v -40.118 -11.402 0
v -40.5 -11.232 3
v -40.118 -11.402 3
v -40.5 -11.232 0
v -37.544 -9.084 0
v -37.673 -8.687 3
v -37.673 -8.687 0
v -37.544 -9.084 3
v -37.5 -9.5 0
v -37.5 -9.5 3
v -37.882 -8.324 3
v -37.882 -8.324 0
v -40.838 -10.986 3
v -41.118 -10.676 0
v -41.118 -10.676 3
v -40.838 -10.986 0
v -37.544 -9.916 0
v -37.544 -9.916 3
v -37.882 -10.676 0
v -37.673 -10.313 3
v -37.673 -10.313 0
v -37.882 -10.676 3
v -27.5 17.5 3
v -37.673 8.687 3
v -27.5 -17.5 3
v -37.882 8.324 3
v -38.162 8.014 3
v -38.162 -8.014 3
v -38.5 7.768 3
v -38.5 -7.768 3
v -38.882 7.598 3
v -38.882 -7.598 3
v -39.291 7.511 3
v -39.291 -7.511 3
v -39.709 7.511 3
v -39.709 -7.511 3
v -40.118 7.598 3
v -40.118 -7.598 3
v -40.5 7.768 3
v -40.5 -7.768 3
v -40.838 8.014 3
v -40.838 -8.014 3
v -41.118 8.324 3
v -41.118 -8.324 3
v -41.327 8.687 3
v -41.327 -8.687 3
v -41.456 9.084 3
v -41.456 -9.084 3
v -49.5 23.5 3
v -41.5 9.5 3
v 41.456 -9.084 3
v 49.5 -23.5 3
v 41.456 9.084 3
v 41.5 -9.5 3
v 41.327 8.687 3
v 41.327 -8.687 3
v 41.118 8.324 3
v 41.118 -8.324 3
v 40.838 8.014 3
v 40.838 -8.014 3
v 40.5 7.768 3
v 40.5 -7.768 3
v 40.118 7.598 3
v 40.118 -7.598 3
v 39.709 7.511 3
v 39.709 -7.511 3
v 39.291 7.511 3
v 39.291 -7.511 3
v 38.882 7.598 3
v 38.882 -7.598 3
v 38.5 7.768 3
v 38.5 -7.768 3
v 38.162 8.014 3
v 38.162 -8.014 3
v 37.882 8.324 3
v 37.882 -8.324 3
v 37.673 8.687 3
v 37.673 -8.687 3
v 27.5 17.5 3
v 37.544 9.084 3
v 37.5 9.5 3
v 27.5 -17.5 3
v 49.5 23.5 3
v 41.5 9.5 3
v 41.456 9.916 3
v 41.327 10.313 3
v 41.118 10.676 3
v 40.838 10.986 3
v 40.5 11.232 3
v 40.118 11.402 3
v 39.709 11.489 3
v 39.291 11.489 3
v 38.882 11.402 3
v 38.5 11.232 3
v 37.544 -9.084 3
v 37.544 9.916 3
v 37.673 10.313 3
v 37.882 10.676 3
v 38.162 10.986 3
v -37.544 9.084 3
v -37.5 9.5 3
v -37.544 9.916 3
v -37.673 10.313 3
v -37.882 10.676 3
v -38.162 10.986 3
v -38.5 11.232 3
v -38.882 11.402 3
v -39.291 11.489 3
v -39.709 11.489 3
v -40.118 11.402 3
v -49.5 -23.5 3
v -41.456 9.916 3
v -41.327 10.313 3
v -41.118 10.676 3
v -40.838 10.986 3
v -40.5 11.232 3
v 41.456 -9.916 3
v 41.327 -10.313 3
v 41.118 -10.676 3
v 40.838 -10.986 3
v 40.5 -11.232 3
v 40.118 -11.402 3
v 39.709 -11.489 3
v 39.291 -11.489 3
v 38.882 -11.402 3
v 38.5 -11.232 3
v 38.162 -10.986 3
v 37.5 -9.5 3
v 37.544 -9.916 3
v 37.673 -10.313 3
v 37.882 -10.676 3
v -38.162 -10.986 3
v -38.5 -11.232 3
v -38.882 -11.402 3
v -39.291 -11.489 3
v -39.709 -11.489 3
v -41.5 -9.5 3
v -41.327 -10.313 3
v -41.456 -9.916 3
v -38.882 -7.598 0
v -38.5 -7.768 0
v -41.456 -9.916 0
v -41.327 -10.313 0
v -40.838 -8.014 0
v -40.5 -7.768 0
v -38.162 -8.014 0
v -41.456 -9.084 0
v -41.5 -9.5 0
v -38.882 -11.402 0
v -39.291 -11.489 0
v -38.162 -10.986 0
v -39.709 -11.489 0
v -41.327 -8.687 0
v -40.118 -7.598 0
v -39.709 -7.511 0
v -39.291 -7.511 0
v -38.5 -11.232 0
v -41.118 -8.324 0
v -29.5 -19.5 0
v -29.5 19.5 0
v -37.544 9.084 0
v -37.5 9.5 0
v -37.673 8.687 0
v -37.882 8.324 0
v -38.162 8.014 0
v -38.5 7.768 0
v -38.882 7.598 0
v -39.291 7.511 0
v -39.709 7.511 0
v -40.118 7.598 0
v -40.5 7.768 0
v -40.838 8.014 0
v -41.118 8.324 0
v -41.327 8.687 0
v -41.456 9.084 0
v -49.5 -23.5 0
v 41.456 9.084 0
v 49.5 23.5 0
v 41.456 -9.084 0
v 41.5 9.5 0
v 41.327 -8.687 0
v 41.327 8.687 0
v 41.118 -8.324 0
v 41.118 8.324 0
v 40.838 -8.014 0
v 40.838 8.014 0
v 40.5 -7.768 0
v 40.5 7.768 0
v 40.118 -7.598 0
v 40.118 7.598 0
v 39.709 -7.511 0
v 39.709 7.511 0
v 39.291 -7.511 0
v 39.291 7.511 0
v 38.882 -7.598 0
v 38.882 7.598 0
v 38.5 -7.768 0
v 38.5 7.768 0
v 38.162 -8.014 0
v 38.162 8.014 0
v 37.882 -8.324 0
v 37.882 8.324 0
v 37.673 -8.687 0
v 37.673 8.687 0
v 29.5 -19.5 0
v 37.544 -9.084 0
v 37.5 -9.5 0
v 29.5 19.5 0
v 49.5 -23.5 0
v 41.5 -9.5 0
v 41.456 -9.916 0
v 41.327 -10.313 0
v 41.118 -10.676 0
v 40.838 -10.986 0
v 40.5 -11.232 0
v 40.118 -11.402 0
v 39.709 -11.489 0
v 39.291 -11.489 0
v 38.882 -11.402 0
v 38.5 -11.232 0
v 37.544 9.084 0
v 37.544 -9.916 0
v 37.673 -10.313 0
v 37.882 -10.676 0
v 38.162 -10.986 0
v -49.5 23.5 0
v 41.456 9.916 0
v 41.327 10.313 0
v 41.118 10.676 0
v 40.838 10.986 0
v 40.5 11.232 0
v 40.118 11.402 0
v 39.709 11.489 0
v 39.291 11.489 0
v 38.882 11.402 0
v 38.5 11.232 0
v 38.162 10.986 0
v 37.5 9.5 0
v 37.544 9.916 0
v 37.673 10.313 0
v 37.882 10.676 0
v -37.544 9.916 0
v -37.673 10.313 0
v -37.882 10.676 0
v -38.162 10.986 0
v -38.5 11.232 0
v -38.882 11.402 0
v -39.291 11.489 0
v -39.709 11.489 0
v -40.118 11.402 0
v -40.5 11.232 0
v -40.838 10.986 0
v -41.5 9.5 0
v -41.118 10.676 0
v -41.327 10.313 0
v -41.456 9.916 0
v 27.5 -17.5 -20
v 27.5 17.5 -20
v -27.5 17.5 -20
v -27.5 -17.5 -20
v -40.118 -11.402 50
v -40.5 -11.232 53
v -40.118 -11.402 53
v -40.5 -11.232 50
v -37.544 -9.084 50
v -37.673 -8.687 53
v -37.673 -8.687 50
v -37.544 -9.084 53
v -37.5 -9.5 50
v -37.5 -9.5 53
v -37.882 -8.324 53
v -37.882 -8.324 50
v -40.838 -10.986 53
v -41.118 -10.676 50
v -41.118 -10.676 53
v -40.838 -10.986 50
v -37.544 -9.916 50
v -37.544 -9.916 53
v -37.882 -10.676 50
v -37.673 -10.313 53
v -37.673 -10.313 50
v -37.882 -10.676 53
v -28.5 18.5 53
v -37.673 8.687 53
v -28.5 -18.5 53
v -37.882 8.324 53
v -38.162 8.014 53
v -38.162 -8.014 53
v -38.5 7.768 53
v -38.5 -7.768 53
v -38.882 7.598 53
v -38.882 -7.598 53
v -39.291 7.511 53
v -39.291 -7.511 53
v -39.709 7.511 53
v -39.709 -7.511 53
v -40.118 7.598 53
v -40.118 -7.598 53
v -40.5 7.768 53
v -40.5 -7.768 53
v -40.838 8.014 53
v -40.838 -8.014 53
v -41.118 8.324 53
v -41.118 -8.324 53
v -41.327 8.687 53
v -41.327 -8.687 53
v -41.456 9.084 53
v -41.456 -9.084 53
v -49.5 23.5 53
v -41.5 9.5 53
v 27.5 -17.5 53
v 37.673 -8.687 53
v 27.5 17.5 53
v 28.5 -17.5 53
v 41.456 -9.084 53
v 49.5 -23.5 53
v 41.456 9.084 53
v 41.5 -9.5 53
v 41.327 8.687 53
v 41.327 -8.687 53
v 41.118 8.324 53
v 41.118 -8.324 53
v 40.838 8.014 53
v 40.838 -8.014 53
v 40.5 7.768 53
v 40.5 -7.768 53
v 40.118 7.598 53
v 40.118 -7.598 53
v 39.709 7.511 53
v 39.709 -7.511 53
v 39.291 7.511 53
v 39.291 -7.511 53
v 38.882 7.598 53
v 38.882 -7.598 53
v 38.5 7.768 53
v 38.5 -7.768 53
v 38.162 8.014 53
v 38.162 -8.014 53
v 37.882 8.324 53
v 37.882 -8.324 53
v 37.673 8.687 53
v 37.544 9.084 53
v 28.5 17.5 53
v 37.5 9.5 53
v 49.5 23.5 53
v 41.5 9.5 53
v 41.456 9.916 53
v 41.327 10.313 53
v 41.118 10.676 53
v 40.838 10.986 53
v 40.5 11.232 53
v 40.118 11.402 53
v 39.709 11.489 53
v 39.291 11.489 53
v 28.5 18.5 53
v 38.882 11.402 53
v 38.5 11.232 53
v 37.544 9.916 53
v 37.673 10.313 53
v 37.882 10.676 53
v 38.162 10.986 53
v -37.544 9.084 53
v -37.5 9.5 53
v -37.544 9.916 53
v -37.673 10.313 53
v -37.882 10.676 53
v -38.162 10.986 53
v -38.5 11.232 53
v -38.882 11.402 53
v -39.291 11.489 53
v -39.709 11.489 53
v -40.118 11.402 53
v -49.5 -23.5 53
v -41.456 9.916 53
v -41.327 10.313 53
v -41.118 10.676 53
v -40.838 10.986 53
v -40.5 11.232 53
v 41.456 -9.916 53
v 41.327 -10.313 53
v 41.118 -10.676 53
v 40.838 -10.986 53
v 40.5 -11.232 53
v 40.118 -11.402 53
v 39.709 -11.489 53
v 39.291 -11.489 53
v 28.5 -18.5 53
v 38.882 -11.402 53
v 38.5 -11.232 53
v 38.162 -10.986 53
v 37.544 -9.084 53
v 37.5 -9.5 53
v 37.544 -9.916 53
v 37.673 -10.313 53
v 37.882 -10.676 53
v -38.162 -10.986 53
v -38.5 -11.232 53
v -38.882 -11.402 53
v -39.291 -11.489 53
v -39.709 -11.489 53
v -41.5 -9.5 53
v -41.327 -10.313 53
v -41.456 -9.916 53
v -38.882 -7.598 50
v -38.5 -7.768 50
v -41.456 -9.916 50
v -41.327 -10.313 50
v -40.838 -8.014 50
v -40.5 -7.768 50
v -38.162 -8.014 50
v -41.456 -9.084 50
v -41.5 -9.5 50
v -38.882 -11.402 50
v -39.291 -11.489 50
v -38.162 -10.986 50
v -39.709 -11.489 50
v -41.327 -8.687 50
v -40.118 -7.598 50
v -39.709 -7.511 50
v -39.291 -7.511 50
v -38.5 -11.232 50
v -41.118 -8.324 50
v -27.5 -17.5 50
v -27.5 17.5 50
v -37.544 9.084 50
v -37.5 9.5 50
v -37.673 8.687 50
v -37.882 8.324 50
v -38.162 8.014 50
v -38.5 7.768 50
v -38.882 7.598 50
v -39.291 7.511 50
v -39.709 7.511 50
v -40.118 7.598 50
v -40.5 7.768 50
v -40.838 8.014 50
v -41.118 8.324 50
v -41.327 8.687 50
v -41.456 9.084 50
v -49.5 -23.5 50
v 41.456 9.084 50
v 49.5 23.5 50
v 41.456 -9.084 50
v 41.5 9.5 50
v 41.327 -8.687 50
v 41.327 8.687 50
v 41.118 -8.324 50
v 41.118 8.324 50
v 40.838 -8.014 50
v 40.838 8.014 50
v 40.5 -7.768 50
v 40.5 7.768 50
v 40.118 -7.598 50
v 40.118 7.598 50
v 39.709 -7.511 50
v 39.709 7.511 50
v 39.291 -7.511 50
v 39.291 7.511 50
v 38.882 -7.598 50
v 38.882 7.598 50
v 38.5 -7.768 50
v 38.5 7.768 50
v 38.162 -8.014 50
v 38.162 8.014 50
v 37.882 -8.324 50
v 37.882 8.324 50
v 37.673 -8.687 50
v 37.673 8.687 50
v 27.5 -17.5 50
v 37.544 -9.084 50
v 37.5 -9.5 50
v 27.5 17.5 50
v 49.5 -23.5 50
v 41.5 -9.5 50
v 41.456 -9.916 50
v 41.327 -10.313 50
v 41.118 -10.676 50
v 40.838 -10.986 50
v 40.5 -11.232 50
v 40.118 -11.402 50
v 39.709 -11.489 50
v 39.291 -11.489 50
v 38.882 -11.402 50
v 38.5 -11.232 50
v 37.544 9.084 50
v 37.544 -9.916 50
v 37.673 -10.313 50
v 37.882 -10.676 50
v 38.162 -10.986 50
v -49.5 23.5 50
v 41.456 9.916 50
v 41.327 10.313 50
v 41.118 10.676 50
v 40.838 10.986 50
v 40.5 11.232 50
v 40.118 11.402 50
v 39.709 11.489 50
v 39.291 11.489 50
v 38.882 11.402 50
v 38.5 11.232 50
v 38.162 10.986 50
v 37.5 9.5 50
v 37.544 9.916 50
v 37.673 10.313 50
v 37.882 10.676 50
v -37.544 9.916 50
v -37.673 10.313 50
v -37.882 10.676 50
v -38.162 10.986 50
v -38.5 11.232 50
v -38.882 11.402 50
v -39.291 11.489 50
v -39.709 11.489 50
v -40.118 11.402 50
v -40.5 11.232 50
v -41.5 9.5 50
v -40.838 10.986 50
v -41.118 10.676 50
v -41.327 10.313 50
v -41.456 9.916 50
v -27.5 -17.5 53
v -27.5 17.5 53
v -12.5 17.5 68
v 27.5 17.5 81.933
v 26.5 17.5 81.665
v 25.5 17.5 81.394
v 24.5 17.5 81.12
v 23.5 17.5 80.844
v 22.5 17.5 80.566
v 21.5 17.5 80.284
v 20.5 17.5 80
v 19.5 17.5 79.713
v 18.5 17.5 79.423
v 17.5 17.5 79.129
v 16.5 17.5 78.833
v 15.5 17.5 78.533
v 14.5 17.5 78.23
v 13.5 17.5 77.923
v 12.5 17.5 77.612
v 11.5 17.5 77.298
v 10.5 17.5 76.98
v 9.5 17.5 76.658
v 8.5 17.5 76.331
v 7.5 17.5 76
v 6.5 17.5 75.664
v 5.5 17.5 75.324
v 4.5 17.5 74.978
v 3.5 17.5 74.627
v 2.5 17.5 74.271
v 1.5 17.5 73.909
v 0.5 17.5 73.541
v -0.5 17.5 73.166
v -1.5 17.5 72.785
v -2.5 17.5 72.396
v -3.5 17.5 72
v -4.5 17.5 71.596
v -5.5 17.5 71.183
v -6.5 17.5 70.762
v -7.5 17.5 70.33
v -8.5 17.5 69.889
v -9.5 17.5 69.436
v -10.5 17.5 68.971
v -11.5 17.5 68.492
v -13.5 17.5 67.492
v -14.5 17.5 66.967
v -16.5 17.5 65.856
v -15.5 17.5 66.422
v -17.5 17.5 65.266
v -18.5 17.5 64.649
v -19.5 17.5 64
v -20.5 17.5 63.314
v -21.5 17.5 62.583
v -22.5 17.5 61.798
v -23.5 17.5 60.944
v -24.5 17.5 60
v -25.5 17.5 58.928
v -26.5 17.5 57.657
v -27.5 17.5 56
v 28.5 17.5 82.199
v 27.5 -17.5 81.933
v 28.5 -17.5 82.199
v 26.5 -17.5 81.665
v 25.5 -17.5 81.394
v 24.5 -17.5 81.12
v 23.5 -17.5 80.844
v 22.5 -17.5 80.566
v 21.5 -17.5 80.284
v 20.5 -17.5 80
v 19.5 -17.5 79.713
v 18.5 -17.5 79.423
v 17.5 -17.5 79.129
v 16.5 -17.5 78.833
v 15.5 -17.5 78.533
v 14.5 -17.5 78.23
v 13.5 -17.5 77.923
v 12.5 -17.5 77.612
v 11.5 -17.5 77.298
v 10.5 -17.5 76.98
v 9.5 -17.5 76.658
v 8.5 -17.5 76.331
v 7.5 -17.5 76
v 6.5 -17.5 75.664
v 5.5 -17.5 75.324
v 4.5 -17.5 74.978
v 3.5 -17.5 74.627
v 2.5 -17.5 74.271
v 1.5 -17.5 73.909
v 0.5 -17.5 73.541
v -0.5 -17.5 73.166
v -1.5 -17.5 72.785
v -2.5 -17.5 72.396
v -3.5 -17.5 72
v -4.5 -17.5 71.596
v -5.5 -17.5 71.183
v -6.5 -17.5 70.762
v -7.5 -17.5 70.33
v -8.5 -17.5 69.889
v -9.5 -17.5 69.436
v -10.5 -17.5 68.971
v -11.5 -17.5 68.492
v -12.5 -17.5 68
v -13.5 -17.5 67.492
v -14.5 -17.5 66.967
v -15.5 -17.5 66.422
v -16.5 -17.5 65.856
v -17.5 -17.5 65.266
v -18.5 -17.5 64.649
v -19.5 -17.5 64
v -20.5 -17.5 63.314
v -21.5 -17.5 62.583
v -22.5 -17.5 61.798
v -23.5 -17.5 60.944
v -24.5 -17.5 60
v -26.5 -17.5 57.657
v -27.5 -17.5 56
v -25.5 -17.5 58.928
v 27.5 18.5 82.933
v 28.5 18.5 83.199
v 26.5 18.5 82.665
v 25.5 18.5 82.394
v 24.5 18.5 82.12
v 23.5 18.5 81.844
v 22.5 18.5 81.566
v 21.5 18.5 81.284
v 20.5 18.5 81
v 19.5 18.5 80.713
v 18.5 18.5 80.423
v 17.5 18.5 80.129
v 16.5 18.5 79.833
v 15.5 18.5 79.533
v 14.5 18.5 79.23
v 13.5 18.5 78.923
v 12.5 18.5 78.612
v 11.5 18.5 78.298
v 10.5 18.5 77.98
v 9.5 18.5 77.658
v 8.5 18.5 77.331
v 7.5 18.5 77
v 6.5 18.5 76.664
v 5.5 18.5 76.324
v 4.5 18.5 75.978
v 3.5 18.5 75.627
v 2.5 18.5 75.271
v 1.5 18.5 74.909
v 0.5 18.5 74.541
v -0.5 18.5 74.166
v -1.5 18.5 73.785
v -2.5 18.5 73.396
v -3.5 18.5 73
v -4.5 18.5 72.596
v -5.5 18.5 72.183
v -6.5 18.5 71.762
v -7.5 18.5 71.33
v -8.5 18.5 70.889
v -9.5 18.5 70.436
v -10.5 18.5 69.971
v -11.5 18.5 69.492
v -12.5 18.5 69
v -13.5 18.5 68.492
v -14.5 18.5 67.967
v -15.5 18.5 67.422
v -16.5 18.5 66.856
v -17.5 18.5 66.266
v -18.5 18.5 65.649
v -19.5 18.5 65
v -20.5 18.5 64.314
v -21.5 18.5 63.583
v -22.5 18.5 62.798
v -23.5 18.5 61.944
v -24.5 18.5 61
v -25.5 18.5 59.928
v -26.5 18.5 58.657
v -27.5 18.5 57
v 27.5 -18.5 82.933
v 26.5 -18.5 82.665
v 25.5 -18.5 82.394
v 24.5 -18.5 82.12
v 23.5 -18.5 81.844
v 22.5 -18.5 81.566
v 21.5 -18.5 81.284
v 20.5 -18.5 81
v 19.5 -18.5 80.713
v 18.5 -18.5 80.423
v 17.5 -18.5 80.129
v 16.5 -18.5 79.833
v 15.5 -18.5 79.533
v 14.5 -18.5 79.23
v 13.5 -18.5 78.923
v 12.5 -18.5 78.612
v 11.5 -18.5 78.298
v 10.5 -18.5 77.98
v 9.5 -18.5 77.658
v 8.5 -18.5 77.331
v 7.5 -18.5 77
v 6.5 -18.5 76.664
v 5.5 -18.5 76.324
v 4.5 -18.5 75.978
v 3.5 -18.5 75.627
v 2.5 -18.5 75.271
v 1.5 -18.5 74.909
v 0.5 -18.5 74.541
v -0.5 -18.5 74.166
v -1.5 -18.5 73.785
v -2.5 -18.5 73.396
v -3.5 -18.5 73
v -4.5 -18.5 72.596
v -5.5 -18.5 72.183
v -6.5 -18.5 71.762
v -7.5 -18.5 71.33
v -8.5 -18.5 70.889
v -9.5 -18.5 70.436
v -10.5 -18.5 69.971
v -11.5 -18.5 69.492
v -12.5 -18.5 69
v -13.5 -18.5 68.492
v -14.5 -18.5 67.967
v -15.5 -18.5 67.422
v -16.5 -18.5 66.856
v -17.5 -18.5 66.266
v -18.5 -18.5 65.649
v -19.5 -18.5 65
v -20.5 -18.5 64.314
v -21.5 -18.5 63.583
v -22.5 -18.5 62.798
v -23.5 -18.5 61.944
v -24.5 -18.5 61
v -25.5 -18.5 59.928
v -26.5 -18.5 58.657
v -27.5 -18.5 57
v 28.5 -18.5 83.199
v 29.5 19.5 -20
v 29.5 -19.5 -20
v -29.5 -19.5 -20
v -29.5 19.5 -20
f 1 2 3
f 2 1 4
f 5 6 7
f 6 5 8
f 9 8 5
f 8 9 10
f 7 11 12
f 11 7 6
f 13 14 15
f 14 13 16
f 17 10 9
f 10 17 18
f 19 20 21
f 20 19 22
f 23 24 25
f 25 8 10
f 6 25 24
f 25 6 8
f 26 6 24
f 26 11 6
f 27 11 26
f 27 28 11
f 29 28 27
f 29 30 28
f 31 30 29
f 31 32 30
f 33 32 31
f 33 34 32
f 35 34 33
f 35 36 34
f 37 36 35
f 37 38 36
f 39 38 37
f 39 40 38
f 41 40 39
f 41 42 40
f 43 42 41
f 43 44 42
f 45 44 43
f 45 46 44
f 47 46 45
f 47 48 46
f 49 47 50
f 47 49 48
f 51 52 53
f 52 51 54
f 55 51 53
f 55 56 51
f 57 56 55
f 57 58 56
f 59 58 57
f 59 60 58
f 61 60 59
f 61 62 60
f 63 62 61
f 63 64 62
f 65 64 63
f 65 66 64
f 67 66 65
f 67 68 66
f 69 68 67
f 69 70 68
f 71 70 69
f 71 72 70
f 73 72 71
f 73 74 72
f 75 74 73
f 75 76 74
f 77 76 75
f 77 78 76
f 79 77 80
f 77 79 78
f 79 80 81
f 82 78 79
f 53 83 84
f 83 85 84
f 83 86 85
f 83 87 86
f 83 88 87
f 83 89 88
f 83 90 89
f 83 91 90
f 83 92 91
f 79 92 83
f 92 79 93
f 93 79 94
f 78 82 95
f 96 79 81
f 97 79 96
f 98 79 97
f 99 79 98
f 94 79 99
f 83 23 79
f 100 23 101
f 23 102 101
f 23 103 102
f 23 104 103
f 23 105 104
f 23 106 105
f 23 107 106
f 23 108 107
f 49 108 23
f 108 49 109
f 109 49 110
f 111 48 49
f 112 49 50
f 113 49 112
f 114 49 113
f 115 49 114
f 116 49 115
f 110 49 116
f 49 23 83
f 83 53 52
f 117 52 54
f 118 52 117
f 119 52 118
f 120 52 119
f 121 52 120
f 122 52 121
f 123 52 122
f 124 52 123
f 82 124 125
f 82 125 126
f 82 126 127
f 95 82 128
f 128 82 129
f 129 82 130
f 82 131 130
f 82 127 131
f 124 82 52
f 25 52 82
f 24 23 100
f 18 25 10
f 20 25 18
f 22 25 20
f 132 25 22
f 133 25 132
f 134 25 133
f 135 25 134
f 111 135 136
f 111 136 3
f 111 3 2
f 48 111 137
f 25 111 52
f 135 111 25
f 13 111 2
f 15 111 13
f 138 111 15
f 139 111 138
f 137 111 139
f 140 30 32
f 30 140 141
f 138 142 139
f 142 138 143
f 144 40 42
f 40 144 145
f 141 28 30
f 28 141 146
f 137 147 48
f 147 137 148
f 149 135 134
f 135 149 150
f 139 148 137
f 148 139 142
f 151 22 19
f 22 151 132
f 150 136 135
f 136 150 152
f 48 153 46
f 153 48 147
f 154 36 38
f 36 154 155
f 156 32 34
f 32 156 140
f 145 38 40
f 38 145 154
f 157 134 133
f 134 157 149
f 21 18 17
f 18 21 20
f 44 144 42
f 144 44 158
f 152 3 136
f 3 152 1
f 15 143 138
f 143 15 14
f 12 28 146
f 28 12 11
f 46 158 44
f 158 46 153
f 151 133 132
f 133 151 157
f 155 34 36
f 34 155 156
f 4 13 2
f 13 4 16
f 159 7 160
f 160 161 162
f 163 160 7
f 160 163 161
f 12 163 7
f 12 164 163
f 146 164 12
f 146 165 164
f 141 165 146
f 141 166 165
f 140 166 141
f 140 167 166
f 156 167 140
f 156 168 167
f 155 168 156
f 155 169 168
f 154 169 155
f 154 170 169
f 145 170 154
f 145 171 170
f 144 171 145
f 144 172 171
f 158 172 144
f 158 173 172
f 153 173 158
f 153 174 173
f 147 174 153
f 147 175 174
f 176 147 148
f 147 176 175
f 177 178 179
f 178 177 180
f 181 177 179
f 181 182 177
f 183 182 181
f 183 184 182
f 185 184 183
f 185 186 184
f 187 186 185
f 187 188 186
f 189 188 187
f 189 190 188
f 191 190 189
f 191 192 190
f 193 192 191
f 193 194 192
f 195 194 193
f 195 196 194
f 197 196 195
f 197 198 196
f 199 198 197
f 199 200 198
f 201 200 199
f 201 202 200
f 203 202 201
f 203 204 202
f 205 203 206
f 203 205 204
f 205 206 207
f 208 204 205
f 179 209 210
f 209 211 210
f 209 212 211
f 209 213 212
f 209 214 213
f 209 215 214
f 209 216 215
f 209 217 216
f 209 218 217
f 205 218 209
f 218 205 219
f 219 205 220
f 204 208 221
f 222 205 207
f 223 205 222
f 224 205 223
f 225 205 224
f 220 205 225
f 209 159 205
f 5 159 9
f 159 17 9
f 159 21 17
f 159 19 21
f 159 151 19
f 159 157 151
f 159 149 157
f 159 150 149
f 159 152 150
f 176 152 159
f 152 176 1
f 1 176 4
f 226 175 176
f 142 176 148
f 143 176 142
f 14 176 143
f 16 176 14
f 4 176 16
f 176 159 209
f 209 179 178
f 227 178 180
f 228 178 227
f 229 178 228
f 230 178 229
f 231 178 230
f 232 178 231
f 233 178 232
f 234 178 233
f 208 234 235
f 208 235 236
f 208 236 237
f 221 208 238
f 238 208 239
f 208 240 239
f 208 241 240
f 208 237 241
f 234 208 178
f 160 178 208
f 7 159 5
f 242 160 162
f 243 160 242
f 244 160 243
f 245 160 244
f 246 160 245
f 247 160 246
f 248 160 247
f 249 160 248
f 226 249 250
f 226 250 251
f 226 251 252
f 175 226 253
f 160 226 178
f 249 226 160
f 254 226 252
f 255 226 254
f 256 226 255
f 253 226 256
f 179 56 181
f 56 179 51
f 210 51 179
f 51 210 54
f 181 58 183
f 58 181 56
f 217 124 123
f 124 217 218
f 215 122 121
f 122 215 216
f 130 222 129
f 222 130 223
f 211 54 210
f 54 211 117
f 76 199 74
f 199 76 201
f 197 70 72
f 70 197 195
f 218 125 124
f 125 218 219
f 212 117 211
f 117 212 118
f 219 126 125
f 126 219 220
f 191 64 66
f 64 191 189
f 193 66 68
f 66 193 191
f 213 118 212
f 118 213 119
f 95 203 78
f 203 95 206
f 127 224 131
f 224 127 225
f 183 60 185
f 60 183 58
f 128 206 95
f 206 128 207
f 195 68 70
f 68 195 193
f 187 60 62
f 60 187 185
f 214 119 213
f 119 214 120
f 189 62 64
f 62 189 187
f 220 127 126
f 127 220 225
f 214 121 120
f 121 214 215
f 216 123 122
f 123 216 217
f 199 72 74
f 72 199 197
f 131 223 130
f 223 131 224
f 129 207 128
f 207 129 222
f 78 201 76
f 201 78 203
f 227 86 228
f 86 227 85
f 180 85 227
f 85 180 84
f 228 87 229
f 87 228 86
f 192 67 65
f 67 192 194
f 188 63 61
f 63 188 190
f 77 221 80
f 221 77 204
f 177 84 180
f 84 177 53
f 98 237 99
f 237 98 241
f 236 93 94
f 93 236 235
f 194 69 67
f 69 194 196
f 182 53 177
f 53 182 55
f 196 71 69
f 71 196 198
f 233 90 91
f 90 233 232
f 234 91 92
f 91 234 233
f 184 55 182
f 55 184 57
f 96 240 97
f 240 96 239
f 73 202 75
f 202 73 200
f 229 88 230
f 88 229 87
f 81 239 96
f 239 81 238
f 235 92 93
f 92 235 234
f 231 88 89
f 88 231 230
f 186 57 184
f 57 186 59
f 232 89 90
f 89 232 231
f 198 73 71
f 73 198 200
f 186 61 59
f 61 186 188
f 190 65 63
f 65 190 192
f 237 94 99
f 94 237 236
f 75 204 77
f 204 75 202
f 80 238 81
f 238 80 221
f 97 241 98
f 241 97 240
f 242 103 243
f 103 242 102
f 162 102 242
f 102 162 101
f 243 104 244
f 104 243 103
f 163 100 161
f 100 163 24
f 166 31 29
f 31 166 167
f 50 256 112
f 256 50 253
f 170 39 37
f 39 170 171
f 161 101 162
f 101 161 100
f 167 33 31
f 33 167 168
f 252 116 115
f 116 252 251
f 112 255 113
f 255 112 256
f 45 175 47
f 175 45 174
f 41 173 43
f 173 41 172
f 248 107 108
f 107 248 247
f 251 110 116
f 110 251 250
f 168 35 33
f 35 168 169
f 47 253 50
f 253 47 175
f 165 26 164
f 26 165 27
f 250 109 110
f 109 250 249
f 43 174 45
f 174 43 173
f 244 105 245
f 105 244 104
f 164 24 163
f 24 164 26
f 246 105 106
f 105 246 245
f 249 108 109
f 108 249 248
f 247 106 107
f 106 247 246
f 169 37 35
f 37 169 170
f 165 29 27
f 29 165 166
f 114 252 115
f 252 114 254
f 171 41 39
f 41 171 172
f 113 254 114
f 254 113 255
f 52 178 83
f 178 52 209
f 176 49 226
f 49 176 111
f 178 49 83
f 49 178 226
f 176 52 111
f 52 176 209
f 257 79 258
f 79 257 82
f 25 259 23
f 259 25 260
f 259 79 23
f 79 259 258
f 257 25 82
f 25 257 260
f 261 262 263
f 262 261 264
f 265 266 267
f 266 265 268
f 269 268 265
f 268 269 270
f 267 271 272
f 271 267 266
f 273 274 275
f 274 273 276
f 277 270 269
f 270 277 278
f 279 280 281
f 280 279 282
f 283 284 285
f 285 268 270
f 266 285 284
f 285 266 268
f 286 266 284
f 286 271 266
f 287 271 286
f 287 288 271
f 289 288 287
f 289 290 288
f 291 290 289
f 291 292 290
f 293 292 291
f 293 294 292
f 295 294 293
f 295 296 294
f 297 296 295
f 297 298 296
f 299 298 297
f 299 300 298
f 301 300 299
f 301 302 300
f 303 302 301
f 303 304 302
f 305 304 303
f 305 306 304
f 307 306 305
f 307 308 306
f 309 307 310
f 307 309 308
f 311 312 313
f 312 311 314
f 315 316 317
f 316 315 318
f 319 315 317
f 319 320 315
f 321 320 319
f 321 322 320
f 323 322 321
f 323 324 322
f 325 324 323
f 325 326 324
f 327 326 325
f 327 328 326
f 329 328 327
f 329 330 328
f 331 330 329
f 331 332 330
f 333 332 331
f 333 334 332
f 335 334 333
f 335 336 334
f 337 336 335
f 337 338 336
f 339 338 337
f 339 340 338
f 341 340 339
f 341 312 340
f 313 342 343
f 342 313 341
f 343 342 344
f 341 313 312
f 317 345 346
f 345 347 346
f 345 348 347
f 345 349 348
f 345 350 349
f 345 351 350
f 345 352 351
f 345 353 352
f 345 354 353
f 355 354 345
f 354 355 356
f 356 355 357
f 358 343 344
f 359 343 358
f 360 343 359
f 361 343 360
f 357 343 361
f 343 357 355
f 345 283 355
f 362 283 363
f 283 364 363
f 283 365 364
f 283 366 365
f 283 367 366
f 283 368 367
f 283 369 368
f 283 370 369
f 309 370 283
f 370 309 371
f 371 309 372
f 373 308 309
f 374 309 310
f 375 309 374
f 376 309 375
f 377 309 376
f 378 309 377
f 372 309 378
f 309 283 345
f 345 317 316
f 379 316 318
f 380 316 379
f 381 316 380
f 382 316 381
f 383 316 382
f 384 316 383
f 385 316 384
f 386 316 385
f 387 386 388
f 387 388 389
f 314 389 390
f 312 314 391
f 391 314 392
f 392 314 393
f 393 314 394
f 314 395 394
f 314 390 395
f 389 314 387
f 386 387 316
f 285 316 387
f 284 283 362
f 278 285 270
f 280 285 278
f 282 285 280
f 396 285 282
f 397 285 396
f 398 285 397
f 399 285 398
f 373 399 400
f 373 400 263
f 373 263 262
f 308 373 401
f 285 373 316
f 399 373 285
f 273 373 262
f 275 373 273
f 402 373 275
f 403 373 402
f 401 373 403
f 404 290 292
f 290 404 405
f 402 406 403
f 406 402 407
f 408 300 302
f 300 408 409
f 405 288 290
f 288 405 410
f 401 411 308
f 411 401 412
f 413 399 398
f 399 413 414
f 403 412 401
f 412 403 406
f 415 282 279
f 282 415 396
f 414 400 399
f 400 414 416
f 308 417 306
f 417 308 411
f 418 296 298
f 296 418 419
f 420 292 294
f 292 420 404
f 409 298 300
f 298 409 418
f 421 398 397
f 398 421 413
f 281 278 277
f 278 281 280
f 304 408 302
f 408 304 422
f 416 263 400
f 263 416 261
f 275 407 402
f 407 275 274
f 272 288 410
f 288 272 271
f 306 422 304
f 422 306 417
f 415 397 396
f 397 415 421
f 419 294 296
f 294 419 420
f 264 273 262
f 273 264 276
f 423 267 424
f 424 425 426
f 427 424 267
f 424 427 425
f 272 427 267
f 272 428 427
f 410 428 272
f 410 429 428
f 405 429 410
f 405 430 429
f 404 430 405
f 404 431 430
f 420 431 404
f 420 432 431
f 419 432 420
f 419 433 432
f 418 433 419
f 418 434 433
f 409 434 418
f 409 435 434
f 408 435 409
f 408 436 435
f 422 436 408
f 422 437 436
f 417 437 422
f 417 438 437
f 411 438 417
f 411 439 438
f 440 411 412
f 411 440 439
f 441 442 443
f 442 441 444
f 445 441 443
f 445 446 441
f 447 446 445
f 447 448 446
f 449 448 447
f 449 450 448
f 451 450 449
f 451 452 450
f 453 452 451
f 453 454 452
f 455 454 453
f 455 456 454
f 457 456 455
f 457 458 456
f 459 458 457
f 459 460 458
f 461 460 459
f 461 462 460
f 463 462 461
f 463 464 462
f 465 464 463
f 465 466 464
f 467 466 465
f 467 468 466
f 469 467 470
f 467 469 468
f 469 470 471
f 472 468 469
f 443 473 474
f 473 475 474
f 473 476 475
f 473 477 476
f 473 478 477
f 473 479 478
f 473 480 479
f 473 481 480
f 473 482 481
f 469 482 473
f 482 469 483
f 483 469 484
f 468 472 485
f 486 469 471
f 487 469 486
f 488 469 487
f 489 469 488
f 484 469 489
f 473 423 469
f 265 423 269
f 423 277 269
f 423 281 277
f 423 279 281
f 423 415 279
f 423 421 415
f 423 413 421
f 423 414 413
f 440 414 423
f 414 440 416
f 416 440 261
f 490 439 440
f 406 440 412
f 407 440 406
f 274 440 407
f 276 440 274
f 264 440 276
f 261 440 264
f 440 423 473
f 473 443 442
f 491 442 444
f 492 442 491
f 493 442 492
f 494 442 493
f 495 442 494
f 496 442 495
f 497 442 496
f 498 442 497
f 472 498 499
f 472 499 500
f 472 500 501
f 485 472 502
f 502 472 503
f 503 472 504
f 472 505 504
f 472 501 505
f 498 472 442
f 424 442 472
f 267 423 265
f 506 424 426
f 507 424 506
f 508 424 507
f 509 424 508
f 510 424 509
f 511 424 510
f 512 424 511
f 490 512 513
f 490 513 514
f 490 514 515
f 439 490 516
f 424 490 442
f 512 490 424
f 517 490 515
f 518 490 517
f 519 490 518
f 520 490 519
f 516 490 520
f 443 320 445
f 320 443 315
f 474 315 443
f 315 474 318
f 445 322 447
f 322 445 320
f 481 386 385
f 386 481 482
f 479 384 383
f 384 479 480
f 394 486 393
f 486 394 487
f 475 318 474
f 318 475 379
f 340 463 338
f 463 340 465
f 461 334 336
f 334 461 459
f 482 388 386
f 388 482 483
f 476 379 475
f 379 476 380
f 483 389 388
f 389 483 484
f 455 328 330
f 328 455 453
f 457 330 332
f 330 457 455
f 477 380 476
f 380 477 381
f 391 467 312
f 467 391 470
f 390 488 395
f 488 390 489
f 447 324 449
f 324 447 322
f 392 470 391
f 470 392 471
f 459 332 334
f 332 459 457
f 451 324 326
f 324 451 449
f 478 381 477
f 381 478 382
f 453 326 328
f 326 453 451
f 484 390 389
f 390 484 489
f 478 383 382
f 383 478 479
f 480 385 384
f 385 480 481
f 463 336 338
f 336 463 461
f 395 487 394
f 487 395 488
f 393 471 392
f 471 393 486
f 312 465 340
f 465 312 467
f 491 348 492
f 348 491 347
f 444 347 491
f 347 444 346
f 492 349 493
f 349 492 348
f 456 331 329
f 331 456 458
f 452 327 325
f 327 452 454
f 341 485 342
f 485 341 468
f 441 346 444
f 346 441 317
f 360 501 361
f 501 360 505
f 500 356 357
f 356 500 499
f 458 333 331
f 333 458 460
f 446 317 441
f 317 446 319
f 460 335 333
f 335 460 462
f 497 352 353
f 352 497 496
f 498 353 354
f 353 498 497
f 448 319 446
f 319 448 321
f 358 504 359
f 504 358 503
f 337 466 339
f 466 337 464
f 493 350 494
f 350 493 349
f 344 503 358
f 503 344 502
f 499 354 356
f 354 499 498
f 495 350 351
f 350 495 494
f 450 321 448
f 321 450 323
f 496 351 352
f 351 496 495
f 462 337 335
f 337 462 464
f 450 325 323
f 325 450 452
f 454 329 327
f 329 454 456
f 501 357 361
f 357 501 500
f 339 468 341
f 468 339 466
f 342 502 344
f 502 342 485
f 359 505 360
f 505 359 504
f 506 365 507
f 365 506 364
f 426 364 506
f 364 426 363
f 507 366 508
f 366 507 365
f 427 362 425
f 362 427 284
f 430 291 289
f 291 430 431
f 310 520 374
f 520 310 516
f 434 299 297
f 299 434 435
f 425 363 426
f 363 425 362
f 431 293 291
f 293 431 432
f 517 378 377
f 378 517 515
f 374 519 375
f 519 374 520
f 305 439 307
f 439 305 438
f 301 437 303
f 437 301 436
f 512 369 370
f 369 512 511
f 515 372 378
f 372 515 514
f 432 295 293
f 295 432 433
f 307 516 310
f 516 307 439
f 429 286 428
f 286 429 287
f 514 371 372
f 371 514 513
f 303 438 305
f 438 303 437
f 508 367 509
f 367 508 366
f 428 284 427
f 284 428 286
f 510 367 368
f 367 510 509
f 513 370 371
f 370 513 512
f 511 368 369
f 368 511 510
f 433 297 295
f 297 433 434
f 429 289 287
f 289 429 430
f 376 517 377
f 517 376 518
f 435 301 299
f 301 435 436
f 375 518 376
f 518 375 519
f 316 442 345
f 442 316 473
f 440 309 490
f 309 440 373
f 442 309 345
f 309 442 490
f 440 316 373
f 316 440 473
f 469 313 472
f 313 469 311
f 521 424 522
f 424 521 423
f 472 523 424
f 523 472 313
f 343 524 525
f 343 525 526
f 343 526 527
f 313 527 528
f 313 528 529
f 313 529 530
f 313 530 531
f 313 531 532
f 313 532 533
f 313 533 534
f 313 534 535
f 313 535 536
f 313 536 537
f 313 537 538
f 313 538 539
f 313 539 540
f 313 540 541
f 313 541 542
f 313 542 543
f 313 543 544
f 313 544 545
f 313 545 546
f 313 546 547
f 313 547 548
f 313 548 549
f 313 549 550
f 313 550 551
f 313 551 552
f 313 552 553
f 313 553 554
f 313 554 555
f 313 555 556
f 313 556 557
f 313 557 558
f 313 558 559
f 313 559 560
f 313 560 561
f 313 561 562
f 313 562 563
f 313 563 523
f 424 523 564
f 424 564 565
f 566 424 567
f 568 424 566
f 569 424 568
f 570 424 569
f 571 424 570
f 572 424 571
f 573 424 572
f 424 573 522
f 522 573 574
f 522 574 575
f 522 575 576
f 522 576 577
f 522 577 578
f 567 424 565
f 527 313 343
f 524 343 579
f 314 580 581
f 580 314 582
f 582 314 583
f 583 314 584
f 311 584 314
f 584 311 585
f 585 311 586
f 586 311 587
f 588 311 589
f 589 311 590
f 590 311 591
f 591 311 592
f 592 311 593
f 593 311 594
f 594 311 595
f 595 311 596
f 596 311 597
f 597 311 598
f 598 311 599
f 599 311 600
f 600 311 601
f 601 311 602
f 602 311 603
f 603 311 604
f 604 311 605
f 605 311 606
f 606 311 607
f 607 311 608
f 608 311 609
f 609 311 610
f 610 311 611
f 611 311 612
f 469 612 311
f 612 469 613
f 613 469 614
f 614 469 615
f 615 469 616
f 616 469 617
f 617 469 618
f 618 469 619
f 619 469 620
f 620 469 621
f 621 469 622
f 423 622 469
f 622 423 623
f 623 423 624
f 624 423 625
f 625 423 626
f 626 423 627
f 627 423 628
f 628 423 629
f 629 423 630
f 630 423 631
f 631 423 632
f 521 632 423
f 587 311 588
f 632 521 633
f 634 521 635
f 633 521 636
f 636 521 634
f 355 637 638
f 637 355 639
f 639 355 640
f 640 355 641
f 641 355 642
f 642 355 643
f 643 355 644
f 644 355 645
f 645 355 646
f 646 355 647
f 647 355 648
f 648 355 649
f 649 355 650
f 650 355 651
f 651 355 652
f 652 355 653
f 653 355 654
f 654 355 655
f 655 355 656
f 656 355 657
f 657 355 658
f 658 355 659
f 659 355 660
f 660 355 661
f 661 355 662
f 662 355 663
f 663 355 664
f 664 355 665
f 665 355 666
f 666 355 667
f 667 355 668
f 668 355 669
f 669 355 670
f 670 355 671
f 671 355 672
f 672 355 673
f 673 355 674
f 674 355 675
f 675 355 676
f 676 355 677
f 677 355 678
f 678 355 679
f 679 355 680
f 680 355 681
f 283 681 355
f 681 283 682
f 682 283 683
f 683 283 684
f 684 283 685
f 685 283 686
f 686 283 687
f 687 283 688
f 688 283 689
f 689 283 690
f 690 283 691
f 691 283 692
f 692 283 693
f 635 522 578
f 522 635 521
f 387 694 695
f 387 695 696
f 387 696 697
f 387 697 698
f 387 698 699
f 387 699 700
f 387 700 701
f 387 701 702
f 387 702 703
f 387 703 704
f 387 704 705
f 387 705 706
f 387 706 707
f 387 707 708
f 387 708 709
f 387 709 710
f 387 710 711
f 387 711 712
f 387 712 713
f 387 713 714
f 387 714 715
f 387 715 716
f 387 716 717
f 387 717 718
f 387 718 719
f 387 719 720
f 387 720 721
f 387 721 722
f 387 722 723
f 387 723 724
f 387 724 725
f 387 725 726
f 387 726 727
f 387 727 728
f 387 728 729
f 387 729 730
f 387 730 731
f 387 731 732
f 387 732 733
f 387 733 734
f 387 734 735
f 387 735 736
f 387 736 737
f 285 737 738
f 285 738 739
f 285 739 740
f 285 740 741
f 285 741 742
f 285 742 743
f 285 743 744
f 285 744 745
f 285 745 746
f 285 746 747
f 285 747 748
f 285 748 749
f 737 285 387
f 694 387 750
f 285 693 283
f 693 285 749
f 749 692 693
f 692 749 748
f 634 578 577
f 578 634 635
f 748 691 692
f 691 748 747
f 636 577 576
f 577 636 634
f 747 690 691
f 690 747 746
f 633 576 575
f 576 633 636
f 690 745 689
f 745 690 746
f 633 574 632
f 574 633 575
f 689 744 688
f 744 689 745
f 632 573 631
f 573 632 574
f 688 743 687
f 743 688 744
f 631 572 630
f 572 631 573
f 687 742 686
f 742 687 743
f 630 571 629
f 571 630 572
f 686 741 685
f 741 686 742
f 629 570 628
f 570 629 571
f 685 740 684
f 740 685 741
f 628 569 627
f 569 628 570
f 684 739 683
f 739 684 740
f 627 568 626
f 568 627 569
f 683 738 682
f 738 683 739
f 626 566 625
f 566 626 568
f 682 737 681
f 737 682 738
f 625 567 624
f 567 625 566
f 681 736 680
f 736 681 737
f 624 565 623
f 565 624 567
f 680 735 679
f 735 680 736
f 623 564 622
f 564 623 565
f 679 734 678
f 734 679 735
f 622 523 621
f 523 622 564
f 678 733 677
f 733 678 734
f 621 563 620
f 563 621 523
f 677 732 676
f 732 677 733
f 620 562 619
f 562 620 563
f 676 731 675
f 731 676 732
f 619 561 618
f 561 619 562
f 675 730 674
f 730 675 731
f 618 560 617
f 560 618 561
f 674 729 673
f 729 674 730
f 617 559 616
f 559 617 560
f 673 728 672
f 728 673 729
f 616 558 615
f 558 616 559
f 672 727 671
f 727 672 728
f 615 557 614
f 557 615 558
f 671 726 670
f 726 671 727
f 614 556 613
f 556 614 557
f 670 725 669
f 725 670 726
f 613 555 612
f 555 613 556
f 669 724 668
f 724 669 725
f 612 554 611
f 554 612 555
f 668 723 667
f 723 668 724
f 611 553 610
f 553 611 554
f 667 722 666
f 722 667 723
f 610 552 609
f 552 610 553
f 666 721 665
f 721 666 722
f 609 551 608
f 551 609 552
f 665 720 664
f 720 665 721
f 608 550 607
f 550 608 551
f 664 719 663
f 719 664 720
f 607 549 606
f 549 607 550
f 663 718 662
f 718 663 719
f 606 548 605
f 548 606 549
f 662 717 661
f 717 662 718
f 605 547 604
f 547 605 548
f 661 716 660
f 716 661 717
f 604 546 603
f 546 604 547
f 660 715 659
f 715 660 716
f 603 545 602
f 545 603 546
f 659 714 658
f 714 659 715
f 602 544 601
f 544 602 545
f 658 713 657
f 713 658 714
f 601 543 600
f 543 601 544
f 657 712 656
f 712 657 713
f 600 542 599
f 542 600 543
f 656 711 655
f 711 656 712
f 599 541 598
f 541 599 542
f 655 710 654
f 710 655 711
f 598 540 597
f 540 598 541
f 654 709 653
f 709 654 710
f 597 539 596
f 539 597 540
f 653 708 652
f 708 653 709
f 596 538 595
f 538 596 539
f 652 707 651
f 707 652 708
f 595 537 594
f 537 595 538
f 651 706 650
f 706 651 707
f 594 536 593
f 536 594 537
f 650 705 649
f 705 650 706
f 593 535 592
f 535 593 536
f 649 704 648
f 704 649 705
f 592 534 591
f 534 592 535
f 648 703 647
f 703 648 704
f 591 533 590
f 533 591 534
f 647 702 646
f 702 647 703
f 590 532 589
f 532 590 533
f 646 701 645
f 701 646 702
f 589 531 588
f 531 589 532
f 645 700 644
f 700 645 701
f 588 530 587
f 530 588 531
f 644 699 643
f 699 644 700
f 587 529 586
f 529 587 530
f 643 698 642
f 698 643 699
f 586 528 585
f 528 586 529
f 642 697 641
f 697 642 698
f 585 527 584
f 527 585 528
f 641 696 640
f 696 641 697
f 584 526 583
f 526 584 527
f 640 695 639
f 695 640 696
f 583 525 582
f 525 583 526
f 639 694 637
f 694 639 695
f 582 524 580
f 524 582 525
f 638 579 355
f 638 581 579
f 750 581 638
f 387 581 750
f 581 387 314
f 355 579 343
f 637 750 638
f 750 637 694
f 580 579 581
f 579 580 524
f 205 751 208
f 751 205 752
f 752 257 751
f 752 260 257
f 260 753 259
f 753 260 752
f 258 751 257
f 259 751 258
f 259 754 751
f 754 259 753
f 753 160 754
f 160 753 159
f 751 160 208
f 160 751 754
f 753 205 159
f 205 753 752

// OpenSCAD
part = "both"; //[both, top, bottom]

ductWidth = 39; //[200]
ductLength = 59; //[200]
ductDepth = 20; //[200]

//Duct Wall Thickness
wallThickness = 2; //[10]

//Baseplate Width
plateWidth = 47; //[200]
//Baseplate Length
plateLength = 99; //[200]
basePlateThickness = 3; //[20]

outletAngleDegrees = 30; //[90]
outletWallThickness = 1; //[10]

//Screwhole Diameter
holeDiameter = 4; //[10]
//X-offset from outer edge to center of screwhole
xHoleOffset = 10; //[100]
//Y-offset from outer edge to center of screwhole
yHoleOffset = 14; //[100]

// Distance between polygons in the outlet
outletRes = 1; //[1]


module mountingHoles(depth){
    x = plateLength - (2 * xHoleOffset);
    y = plateWidth - (2 * yHoleOffset);
    module mountingHole(depth, diameter) {
        cylinder(h = depth, r = 0.5 * diameter, center = false, $fs=0.1);
    }
    union(){
        mountingHole(depth, holeDiameter);
        translate([x,0]) mountingHole(depth, holeDiameter);
        translate([x,y]) mountingHole(depth, holeDiameter);
        translate([0,y]) mountingHole(depth, holeDiameter);
    }
}

module basePlate(){
    cutoutX = ductLength - 2 * wallThickness;
    cutoutY = ductWidth - 2 * wallThickness;
    translate([-0.5 * plateLength, -0.5 * plateWidth]) difference(){
        cube(size = [plateLength, plateWidth, basePlateThickness]);
        translate([xHoleOffset, yHoleOffset, 0]){
            mountingHoles(basePlateThickness);
        }
        translate([0.5 * (plateLength - cutoutX), 0.5 * (plateWidth - cutoutY), 0]){ 
            cube(size = [ cutoutX, cutoutY, basePlateThickness]);
        }
    }
}

module ductPipe(){
    translate([-0.5 * ductLength, -0.5 * ductWidth]) difference(){
        cube(size = [ductLength, ductWidth, ductDepth]);
        translate([wallThickness, wallThickness]){
            cube(size = [
                ductLength - 2 * wallThickness,
                ductWidth - 2 * wallThickness,
                ductDepth]);
        }
    }
}

module duct(){
    basePlate(plateLength, plateWidth);
    translate([0, 0, -1 * ductDepth]) ductPipe();
}


function ductHeight(x) = sqrt(x)*4; 

module outlet(){
    innerWidth = ductWidth - 2 * wallThickness;
    innerLength = ductLength - 2 * wallThickness;
    innerHeight = tan(outletAngleDegrees) * innerLength;
    
    outerWidth = innerWidth + 2 * outletWallThickness;
    outerHeight = innerHeight + (outletWallThickness/cos(outletAngleDegrees));
    outerLength = outerHeight / tan(outletAngleDegrees);
    
    outletRes = 1;
    translate([-0.5 * innerLength, -0.5 * outerWidth, 0]){
        for(y = [0:outletRes:outerLength-outletRes]){
            difference(){
                //Outer
                translate ([y-outletRes, outerWidth, 0]) rotate([90, 0, 0]) linear_extrude(outerWidth){
                    
                    polygon(points=[
                        [0, 0],
                        [0, ductHeight(y)],
                        [outletRes, ductHeight(y+1)], 
                        [outletRes, 0]
                    ]);
                }
                //Inner
                translate ([y-outletRes, innerWidth+outletWallThickness, 0]) rotate([90, 0, 0]) linear_extrude(innerWidth){
                    polygon(points=[
                        [0, 0],
                        [0, ductHeight(y)-outletWallThickness],
                        [outletRes, ductHeight(y+1)-outletWallThickness], 
                        [outletRes, 0]
                    ]);
                }
             }
        }
    }
}

module ductCover() {
    basePlate(plateLength, plateWidth);
    translate([0, 0, basePlateThickness]) outlet();
}

if(part == "both"){
    translate([0, 0, 50]) ductCover();
    duct();
} else if(part == "top"){
    ductCover();
} else{
    duct();
}
